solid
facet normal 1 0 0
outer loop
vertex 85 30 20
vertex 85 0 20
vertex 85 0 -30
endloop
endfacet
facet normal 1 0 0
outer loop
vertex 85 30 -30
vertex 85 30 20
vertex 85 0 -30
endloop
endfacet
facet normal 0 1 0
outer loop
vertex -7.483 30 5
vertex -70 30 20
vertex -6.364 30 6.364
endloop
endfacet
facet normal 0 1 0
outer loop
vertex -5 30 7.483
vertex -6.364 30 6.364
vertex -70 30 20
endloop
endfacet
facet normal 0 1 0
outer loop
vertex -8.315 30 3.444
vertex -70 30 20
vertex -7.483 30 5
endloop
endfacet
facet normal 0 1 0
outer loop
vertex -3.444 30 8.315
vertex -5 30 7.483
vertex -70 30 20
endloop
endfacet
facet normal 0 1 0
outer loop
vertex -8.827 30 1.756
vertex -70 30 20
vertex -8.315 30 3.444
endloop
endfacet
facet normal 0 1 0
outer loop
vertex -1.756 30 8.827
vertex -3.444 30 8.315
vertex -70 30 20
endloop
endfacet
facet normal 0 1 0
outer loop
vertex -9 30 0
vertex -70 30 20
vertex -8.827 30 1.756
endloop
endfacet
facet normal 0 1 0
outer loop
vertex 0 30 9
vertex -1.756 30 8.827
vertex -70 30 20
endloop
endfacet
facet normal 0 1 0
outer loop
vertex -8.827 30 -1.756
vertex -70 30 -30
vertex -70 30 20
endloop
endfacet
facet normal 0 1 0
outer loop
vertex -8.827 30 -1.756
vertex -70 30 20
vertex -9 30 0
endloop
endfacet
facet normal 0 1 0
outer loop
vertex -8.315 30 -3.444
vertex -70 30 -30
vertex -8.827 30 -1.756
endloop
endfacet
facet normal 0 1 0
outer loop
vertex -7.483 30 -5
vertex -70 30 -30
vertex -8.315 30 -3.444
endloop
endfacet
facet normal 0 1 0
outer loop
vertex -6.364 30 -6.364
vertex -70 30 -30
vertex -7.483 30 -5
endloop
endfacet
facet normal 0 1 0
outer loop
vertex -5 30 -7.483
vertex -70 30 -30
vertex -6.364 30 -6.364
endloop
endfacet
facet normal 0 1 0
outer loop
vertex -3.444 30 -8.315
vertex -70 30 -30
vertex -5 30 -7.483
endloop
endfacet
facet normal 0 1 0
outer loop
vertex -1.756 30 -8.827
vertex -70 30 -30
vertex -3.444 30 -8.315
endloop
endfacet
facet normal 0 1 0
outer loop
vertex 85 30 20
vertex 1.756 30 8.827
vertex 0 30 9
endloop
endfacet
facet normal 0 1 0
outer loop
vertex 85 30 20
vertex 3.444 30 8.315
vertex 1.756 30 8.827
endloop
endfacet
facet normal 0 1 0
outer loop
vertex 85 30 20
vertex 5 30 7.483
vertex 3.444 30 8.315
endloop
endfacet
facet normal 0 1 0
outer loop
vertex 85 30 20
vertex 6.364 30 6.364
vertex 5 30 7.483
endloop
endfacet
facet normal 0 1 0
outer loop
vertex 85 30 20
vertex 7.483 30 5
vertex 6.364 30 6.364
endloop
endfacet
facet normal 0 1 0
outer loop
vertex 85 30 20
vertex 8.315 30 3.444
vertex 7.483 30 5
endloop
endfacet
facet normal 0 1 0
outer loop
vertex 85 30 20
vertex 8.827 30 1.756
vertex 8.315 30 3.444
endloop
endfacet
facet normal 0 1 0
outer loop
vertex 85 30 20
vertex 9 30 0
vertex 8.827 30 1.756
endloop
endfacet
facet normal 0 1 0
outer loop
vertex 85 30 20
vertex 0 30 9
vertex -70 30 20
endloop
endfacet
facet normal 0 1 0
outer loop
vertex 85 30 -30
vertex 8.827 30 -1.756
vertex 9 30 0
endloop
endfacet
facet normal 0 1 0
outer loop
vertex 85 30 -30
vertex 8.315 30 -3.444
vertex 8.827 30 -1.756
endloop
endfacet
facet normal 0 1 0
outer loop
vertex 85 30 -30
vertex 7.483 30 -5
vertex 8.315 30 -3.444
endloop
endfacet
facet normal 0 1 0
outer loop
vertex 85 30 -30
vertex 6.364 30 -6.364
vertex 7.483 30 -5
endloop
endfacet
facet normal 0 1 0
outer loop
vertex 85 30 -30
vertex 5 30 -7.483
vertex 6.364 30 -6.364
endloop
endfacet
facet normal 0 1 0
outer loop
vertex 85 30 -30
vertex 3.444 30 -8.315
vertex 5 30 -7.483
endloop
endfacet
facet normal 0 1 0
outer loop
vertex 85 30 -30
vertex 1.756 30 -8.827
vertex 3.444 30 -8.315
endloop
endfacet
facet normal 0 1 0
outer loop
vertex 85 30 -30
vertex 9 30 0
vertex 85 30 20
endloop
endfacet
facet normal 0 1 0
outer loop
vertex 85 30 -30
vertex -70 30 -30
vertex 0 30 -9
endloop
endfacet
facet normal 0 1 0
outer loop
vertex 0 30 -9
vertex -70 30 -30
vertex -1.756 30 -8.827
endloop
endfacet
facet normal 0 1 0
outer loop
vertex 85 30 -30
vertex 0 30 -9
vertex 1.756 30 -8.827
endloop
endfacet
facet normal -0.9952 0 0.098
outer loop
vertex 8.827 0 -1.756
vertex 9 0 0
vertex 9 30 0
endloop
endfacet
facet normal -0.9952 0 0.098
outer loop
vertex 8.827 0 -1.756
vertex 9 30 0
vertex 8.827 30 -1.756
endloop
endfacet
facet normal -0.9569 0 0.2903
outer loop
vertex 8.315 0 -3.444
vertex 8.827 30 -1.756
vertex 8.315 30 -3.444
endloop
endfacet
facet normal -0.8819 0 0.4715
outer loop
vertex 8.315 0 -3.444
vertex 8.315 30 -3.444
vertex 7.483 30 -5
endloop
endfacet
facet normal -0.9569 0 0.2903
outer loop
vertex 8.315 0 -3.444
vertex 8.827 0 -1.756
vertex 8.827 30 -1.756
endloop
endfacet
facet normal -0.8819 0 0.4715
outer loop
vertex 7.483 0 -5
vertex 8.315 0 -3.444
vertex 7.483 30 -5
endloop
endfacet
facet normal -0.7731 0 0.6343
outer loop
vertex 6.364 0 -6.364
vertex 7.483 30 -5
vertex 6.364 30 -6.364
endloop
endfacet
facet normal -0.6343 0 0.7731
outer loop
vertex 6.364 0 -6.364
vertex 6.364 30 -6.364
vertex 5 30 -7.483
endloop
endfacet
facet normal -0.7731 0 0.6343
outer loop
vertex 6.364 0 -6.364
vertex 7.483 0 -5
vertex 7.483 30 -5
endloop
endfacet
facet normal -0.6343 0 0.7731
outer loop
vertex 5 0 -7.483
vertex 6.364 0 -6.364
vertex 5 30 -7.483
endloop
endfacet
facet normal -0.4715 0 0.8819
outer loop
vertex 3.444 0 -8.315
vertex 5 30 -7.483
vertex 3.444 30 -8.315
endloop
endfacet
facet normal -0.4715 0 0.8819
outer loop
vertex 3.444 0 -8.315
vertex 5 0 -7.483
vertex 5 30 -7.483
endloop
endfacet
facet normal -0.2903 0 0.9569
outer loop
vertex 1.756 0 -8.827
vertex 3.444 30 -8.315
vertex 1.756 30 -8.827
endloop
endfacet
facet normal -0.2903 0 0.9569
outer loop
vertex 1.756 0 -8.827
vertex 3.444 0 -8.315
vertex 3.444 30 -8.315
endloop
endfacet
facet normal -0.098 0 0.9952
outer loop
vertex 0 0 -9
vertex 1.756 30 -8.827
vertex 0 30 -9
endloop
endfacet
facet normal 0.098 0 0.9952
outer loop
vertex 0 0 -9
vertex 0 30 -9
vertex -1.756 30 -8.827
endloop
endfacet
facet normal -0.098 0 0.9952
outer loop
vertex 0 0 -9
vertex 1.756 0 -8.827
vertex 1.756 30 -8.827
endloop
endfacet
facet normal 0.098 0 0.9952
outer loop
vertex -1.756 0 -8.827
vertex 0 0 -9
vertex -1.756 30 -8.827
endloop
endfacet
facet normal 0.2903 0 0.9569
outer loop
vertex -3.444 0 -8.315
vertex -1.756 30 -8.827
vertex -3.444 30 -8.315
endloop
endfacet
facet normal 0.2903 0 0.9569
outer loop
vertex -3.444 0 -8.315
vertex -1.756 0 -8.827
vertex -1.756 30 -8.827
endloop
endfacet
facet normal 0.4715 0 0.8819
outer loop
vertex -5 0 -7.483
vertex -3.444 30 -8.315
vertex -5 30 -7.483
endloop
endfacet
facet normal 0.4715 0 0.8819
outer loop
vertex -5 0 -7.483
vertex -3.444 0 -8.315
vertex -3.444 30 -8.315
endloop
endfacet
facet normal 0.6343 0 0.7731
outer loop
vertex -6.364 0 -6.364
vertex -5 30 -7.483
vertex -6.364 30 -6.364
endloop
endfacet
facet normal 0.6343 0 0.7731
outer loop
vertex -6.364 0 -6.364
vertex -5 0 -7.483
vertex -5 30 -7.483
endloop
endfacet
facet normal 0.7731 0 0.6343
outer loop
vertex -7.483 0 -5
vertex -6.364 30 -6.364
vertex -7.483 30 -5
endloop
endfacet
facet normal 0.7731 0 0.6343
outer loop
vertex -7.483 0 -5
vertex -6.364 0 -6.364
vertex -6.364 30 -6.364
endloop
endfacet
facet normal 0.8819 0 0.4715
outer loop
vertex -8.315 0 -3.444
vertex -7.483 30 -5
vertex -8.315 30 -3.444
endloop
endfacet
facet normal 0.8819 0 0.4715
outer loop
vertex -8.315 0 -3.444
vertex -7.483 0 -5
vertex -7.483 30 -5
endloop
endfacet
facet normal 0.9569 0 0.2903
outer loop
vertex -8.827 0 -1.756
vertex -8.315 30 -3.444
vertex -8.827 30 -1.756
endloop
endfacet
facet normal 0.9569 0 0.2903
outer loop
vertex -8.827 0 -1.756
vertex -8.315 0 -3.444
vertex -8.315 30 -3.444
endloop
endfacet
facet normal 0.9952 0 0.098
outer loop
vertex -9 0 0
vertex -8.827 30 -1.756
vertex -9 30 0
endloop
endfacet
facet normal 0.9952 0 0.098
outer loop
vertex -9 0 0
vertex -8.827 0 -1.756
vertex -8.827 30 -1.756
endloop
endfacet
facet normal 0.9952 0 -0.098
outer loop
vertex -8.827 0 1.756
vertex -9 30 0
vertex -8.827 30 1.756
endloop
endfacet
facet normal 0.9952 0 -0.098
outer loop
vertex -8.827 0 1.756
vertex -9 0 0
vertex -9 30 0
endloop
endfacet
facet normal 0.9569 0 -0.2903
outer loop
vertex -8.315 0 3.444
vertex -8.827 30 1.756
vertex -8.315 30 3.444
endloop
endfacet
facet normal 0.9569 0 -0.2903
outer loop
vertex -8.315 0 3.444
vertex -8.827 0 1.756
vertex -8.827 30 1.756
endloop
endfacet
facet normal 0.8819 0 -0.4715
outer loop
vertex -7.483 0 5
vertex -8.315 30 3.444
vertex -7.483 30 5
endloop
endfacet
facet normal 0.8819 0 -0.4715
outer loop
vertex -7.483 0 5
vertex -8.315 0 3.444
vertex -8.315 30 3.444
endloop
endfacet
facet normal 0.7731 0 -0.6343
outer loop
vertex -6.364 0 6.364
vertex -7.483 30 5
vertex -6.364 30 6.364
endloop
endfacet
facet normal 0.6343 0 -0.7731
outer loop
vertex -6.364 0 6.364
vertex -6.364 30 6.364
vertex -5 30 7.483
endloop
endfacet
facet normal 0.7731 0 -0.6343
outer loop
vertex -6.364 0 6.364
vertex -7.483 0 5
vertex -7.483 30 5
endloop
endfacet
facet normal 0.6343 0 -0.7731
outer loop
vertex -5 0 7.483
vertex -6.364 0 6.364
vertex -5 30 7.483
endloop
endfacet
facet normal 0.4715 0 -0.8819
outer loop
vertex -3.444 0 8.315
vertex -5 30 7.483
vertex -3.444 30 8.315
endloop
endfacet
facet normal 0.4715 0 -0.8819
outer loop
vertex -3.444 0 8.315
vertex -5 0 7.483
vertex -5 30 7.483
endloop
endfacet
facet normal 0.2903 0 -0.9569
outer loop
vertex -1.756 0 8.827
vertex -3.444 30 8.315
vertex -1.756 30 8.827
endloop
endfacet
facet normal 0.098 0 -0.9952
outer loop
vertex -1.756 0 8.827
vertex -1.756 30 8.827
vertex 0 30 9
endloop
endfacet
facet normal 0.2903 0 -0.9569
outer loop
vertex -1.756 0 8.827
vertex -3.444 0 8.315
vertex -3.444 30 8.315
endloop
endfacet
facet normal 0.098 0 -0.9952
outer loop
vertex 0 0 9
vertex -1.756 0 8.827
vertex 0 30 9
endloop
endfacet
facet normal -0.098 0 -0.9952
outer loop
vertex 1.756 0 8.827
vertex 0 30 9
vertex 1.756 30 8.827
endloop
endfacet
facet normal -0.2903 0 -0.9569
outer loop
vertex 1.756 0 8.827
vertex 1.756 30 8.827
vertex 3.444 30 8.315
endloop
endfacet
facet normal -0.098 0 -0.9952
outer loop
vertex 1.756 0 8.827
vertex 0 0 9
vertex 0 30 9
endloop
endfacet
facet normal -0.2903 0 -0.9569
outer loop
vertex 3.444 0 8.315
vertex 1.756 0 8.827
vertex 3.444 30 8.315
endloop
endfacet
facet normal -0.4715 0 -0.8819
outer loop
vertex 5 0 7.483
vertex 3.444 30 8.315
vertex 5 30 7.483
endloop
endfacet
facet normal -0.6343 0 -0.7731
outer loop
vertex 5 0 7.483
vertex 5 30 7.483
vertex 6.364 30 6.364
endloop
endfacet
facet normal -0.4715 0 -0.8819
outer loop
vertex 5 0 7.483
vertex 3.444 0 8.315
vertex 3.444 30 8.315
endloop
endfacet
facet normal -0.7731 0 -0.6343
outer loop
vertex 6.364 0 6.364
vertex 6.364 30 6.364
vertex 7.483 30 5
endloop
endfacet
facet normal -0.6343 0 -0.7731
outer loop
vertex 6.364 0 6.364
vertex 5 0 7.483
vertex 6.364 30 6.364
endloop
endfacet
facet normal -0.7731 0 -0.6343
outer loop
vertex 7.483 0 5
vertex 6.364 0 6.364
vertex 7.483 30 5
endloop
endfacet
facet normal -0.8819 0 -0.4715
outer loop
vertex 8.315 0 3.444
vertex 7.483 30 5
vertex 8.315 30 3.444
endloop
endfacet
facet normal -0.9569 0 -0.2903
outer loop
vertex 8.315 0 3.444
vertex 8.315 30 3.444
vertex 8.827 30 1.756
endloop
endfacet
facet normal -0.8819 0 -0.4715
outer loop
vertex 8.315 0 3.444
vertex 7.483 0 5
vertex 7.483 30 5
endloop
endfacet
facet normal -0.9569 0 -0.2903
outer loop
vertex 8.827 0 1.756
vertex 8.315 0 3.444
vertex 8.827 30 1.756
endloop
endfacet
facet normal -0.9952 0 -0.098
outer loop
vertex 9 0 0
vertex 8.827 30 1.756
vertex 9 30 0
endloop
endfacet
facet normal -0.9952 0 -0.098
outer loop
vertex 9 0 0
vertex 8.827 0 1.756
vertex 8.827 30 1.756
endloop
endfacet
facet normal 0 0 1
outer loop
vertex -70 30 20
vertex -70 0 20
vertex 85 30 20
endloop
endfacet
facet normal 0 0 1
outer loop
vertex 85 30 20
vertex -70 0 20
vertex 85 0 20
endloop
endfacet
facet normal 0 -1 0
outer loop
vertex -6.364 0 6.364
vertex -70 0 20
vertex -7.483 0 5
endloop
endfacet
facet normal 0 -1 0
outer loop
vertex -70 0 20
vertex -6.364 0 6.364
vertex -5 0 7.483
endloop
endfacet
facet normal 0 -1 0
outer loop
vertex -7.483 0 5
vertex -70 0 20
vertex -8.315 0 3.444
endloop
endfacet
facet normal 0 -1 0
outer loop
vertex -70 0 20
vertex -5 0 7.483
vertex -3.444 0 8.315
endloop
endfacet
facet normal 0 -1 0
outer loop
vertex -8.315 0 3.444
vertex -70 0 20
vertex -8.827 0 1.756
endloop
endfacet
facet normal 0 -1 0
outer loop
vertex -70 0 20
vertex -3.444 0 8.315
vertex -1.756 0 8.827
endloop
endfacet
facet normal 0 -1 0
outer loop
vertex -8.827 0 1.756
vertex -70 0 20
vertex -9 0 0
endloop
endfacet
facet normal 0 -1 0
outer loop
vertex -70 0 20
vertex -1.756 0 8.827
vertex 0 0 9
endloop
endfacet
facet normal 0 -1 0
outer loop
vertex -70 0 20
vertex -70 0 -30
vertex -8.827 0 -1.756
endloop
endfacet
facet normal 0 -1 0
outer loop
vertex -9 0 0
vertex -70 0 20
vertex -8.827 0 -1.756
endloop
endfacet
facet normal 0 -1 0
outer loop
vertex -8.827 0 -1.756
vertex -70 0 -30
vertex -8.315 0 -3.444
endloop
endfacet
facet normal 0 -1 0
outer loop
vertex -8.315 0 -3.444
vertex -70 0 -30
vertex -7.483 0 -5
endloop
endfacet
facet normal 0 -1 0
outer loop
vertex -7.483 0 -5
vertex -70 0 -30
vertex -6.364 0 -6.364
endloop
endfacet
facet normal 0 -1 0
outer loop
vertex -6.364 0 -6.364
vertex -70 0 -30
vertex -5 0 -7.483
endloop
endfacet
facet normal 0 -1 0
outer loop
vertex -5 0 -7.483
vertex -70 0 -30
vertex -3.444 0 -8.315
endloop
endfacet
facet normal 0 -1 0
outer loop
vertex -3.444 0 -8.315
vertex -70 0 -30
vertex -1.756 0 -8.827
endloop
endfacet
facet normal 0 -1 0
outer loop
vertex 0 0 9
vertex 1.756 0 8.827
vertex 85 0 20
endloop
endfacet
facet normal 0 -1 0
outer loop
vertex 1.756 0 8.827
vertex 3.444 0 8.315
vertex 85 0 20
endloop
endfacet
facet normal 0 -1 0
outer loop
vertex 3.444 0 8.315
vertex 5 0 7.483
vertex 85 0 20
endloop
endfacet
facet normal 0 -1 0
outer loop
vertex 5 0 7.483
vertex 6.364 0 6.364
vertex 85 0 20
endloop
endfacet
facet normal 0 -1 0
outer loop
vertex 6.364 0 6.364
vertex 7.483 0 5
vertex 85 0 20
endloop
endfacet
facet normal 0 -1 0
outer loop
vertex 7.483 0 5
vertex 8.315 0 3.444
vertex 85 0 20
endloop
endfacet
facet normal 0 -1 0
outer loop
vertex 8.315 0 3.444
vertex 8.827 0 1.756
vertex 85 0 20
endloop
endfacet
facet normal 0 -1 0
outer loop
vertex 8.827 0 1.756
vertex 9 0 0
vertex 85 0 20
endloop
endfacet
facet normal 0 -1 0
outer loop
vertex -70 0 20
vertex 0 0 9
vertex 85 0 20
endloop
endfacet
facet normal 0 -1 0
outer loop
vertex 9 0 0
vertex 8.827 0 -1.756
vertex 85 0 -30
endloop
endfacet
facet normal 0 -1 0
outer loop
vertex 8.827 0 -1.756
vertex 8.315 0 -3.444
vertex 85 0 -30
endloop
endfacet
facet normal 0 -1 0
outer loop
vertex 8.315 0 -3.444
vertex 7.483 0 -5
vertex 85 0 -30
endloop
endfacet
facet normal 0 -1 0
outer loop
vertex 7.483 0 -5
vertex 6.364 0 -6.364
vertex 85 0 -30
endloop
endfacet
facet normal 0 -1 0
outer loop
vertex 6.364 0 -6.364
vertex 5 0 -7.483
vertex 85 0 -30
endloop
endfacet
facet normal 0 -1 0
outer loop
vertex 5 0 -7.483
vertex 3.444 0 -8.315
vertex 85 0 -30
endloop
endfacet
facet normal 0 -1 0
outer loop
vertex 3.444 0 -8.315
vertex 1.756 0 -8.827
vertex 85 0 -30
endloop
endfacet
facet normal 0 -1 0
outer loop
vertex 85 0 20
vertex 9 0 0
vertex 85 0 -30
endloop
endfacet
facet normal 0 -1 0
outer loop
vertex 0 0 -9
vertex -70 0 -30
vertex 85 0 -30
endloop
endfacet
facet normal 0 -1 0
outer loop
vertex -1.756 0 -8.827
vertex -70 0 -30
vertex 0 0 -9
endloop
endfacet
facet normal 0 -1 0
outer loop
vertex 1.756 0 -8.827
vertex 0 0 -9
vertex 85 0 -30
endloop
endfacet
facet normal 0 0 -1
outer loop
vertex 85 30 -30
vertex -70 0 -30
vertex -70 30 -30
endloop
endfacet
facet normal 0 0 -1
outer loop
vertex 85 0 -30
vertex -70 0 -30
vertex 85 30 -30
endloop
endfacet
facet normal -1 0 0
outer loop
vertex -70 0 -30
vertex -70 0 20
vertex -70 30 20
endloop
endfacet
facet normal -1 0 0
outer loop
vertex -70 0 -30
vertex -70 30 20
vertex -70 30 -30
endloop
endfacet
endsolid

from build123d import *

# Parameters (mm, degrees)
SKETCH1_W           = 155
SKETCH1_H           = 50
SKETCH1_R           = 9
BOSS_EXTRUDE1_DEPTH = 30


with BuildPart() as part:
    # Sketch1 → Boss-Extrude1 (new body)
    with BuildSketch(Plane(origin=(0, 0, 0), x_dir=(1, 0, 0), z_dir=(0, 1, 0))):
        with Locations((7.5, 5)):
            Rectangle(SKETCH1_W, SKETCH1_H)
        Circle(SKETCH1_R, mode=Mode.SUBTRACT)
    extrude(amount=BOSS_EXTRUDE1_DEPTH)


solid = part.part
